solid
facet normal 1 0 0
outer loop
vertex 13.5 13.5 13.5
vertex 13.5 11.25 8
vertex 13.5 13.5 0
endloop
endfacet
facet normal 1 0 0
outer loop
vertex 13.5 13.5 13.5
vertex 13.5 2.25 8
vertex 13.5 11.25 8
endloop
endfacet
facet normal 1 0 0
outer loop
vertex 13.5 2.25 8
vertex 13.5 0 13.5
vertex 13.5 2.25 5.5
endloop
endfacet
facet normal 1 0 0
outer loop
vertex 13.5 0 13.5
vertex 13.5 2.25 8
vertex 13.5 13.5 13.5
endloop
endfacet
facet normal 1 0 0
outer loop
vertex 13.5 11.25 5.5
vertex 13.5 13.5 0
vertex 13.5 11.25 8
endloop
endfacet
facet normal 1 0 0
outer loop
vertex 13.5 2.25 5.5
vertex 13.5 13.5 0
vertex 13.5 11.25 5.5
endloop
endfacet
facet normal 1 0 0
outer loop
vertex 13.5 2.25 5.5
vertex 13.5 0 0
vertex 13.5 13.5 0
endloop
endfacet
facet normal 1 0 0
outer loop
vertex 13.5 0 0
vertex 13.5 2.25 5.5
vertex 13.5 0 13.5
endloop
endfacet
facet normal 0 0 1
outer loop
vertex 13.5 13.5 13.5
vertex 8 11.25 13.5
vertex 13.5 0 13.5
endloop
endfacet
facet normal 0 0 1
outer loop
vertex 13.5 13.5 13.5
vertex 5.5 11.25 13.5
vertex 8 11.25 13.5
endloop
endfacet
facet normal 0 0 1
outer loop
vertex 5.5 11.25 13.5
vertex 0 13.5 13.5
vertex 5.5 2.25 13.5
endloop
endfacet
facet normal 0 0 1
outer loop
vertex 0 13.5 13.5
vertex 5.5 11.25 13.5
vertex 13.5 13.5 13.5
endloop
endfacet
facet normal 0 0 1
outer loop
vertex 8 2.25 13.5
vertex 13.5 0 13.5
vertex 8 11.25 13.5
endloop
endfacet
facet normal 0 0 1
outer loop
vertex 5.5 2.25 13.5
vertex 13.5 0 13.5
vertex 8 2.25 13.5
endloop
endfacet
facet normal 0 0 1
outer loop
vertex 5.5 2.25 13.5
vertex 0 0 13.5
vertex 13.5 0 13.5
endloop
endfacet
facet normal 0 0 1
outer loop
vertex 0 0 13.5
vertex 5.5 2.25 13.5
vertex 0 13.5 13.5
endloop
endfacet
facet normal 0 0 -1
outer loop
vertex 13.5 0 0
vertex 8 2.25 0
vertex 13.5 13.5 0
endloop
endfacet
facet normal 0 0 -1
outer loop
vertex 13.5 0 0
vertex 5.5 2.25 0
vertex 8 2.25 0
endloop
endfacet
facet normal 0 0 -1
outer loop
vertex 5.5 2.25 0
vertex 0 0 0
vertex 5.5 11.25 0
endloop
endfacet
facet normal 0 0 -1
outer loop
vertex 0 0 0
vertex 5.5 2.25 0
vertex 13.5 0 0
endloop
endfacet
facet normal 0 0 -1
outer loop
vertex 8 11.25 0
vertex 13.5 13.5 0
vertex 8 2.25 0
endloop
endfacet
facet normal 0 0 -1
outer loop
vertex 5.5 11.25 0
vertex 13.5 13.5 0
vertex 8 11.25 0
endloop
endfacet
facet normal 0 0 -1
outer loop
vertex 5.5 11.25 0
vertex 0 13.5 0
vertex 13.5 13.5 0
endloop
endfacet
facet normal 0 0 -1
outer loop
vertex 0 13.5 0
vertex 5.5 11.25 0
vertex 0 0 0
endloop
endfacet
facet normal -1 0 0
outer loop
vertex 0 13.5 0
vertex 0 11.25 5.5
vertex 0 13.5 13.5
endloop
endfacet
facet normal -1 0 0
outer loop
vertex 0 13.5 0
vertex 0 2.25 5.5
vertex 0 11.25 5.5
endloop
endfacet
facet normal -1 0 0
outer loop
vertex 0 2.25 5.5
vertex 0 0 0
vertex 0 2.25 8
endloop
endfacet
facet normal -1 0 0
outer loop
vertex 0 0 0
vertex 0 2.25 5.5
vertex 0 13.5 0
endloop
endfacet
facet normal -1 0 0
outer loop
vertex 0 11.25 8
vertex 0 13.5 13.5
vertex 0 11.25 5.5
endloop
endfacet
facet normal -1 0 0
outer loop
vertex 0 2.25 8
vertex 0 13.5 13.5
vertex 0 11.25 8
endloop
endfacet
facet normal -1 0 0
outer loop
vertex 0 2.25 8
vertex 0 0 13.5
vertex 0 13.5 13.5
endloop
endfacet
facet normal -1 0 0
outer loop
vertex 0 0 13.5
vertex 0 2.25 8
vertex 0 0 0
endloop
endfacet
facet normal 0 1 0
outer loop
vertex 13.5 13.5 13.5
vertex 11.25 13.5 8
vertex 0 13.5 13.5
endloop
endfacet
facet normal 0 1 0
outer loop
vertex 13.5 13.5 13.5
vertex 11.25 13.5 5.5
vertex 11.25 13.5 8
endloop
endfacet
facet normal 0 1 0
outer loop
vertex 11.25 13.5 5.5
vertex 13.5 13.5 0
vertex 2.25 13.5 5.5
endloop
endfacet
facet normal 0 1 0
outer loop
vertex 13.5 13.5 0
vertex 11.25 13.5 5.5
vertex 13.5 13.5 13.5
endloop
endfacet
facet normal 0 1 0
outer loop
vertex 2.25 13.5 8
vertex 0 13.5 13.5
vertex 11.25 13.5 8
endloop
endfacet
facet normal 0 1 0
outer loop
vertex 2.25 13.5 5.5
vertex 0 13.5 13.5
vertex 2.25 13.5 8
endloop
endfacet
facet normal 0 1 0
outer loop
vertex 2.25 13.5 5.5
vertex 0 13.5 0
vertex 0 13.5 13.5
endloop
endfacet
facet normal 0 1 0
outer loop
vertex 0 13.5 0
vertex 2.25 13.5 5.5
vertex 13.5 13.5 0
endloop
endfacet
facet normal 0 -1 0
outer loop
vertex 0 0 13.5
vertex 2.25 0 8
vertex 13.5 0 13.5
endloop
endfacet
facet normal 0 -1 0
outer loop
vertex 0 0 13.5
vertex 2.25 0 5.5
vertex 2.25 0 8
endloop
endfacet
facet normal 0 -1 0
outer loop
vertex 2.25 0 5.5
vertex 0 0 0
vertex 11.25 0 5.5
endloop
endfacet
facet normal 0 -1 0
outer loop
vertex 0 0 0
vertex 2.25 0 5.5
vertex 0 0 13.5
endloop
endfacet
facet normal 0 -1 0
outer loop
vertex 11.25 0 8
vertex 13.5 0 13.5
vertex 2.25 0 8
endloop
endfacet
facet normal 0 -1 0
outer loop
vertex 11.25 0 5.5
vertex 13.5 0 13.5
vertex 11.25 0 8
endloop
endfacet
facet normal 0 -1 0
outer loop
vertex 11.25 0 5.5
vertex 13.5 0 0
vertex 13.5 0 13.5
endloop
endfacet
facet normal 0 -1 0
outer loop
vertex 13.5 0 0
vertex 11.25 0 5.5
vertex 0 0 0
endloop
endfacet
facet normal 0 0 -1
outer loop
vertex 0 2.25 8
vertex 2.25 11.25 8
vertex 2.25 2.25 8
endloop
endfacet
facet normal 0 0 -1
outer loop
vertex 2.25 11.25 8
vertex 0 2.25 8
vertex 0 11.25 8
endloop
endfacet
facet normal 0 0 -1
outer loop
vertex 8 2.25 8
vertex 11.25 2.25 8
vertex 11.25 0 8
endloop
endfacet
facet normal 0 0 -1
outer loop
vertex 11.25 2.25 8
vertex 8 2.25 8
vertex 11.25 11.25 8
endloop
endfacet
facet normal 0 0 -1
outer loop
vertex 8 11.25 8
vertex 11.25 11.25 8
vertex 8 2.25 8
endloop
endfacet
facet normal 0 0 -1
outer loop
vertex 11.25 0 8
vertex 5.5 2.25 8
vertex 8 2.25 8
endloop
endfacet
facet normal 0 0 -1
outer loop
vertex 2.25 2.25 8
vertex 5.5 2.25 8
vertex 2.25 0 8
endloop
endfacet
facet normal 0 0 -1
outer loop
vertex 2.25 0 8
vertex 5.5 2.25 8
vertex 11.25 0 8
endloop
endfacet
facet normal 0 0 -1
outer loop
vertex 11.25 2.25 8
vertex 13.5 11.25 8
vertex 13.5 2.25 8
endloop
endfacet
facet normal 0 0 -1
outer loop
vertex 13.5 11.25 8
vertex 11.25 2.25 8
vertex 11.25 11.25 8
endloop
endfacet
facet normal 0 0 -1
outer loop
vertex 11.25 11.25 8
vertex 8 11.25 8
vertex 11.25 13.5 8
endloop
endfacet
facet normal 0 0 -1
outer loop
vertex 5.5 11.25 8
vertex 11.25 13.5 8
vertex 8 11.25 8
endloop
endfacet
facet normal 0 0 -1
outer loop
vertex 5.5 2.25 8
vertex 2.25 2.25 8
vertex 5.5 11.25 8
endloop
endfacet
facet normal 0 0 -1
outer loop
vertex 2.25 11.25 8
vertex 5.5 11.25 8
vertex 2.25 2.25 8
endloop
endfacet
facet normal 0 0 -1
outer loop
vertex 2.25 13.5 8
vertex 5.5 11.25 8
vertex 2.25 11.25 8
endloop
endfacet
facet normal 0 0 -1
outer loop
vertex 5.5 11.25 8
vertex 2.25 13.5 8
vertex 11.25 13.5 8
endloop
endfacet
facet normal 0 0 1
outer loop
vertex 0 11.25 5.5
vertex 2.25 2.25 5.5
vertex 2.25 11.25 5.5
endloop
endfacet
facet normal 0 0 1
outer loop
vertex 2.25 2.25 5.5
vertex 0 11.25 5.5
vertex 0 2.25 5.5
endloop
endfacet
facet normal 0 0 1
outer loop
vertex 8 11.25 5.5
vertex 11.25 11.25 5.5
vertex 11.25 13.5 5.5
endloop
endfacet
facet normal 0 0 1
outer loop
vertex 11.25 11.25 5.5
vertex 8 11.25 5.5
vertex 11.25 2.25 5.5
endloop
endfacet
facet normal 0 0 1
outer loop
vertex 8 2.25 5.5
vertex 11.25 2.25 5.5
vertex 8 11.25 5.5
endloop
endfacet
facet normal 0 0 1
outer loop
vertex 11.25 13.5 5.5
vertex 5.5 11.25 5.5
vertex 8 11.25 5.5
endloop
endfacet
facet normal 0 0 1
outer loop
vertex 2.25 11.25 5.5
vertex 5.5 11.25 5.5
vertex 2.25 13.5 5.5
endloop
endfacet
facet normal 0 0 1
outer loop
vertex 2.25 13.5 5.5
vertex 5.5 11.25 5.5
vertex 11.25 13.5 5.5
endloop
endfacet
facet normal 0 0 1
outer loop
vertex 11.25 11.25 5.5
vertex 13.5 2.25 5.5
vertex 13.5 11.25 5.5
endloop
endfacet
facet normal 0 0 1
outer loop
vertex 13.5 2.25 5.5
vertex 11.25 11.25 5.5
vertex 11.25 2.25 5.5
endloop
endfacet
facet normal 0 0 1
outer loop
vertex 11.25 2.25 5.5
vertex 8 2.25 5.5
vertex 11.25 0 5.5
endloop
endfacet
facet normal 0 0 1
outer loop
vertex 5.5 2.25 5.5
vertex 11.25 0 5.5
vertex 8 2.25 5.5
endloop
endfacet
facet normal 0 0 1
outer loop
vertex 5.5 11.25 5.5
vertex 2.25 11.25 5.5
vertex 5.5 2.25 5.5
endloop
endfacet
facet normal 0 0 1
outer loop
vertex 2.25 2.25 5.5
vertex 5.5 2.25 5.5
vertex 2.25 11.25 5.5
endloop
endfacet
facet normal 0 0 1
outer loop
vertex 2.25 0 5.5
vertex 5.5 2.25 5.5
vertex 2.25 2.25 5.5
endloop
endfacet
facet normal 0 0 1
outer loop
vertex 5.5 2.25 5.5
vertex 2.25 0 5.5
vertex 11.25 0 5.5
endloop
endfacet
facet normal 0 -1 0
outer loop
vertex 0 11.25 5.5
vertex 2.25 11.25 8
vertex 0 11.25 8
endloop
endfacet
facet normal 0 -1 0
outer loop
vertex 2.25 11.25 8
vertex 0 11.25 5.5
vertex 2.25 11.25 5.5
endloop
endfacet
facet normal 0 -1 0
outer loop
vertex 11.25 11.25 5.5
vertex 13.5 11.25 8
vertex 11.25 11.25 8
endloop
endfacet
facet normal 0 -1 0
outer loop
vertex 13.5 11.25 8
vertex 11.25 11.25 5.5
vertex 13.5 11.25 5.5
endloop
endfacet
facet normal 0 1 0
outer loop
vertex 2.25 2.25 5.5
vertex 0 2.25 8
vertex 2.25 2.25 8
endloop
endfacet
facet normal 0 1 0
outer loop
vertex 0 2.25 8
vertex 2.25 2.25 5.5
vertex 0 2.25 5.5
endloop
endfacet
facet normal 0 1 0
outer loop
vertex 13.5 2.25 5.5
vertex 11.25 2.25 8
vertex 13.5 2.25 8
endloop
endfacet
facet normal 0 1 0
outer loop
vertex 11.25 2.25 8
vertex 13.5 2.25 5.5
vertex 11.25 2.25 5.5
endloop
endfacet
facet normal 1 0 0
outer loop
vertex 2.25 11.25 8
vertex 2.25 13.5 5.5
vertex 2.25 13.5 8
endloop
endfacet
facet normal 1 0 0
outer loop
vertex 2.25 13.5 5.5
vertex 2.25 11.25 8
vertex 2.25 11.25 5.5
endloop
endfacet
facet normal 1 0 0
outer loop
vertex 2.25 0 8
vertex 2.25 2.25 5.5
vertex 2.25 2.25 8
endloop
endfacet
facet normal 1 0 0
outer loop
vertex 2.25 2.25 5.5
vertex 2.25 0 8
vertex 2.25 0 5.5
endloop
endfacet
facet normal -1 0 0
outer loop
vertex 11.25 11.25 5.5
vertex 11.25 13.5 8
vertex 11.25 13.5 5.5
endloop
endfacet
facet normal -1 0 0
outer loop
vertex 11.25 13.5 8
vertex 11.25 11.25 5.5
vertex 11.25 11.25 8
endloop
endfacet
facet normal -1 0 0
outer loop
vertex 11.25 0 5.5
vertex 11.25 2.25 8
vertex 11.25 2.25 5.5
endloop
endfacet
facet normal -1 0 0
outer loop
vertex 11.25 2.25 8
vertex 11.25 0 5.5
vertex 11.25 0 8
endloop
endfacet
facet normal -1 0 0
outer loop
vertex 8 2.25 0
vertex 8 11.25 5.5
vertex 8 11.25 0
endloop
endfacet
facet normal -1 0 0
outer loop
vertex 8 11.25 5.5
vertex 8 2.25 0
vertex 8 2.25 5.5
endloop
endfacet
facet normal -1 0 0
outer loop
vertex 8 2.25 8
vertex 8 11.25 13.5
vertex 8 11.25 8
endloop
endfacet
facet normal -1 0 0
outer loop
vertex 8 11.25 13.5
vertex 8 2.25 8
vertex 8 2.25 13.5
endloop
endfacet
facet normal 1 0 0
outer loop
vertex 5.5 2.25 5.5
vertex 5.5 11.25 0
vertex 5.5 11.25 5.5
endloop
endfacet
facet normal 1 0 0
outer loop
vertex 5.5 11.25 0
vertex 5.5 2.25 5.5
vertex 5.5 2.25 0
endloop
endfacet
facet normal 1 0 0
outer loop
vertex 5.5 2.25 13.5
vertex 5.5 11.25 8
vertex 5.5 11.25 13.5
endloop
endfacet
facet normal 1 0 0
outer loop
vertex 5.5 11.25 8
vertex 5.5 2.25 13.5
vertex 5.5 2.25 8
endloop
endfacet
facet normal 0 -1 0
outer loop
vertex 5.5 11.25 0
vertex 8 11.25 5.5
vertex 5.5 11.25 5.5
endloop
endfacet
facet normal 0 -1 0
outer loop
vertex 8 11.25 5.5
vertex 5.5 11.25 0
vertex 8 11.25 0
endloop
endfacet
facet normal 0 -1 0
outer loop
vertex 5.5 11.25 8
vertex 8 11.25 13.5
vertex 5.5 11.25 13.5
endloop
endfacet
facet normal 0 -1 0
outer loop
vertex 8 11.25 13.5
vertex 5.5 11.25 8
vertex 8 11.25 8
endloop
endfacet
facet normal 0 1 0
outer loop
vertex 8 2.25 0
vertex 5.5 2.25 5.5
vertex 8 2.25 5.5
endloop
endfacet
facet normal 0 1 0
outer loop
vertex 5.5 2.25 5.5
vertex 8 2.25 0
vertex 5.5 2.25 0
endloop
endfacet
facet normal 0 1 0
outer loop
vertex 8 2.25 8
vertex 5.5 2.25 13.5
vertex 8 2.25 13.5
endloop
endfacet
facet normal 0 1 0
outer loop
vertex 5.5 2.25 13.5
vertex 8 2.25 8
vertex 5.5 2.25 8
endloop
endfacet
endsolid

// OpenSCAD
/*
    Bamboo piece measurements
    8.90x2.23
*/

BAMBOO_WIDTH = 9;
BAMBOO_HEIGHT = 2.5;

L = BAMBOO_WIDTH * 1.5;
W = L;
H = W;

SEPARATORS = false;

difference(){
    cube([L,W,H]);
    
    translate([-W/2,(W/2)-(BAMBOO_WIDTH/2),(H/2)-(BAMBOO_HEIGHT/2)]){
        cube([L*2,BAMBOO_WIDTH,BAMBOO_HEIGHT]);
    }
    
    translate([(W/2)+(BAMBOO_WIDTH/2),-(W/2),(H/2)-(BAMBOO_HEIGHT/2)]){
        rotate([0,0,90]){
            cube([L*2,BAMBOO_WIDTH,BAMBOO_HEIGHT]);
        }
    }
    
    translate([(W/2)-(BAMBOO_HEIGHT/2),(L/2)-(BAMBOO_WIDTH/2),L+(L/2)]){
        rotate([0,90,0]){
            cube([L*2,BAMBOO_WIDTH,BAMBOO_HEIGHT]);
        }
    }
}

// Optional separator
if(SEPARATORS){
    translate([(W/2)-(BAMBOO_HEIGHT/2),0,0]){
        #cube([BAMBOO_HEIGHT,W,H]);
    }
}
